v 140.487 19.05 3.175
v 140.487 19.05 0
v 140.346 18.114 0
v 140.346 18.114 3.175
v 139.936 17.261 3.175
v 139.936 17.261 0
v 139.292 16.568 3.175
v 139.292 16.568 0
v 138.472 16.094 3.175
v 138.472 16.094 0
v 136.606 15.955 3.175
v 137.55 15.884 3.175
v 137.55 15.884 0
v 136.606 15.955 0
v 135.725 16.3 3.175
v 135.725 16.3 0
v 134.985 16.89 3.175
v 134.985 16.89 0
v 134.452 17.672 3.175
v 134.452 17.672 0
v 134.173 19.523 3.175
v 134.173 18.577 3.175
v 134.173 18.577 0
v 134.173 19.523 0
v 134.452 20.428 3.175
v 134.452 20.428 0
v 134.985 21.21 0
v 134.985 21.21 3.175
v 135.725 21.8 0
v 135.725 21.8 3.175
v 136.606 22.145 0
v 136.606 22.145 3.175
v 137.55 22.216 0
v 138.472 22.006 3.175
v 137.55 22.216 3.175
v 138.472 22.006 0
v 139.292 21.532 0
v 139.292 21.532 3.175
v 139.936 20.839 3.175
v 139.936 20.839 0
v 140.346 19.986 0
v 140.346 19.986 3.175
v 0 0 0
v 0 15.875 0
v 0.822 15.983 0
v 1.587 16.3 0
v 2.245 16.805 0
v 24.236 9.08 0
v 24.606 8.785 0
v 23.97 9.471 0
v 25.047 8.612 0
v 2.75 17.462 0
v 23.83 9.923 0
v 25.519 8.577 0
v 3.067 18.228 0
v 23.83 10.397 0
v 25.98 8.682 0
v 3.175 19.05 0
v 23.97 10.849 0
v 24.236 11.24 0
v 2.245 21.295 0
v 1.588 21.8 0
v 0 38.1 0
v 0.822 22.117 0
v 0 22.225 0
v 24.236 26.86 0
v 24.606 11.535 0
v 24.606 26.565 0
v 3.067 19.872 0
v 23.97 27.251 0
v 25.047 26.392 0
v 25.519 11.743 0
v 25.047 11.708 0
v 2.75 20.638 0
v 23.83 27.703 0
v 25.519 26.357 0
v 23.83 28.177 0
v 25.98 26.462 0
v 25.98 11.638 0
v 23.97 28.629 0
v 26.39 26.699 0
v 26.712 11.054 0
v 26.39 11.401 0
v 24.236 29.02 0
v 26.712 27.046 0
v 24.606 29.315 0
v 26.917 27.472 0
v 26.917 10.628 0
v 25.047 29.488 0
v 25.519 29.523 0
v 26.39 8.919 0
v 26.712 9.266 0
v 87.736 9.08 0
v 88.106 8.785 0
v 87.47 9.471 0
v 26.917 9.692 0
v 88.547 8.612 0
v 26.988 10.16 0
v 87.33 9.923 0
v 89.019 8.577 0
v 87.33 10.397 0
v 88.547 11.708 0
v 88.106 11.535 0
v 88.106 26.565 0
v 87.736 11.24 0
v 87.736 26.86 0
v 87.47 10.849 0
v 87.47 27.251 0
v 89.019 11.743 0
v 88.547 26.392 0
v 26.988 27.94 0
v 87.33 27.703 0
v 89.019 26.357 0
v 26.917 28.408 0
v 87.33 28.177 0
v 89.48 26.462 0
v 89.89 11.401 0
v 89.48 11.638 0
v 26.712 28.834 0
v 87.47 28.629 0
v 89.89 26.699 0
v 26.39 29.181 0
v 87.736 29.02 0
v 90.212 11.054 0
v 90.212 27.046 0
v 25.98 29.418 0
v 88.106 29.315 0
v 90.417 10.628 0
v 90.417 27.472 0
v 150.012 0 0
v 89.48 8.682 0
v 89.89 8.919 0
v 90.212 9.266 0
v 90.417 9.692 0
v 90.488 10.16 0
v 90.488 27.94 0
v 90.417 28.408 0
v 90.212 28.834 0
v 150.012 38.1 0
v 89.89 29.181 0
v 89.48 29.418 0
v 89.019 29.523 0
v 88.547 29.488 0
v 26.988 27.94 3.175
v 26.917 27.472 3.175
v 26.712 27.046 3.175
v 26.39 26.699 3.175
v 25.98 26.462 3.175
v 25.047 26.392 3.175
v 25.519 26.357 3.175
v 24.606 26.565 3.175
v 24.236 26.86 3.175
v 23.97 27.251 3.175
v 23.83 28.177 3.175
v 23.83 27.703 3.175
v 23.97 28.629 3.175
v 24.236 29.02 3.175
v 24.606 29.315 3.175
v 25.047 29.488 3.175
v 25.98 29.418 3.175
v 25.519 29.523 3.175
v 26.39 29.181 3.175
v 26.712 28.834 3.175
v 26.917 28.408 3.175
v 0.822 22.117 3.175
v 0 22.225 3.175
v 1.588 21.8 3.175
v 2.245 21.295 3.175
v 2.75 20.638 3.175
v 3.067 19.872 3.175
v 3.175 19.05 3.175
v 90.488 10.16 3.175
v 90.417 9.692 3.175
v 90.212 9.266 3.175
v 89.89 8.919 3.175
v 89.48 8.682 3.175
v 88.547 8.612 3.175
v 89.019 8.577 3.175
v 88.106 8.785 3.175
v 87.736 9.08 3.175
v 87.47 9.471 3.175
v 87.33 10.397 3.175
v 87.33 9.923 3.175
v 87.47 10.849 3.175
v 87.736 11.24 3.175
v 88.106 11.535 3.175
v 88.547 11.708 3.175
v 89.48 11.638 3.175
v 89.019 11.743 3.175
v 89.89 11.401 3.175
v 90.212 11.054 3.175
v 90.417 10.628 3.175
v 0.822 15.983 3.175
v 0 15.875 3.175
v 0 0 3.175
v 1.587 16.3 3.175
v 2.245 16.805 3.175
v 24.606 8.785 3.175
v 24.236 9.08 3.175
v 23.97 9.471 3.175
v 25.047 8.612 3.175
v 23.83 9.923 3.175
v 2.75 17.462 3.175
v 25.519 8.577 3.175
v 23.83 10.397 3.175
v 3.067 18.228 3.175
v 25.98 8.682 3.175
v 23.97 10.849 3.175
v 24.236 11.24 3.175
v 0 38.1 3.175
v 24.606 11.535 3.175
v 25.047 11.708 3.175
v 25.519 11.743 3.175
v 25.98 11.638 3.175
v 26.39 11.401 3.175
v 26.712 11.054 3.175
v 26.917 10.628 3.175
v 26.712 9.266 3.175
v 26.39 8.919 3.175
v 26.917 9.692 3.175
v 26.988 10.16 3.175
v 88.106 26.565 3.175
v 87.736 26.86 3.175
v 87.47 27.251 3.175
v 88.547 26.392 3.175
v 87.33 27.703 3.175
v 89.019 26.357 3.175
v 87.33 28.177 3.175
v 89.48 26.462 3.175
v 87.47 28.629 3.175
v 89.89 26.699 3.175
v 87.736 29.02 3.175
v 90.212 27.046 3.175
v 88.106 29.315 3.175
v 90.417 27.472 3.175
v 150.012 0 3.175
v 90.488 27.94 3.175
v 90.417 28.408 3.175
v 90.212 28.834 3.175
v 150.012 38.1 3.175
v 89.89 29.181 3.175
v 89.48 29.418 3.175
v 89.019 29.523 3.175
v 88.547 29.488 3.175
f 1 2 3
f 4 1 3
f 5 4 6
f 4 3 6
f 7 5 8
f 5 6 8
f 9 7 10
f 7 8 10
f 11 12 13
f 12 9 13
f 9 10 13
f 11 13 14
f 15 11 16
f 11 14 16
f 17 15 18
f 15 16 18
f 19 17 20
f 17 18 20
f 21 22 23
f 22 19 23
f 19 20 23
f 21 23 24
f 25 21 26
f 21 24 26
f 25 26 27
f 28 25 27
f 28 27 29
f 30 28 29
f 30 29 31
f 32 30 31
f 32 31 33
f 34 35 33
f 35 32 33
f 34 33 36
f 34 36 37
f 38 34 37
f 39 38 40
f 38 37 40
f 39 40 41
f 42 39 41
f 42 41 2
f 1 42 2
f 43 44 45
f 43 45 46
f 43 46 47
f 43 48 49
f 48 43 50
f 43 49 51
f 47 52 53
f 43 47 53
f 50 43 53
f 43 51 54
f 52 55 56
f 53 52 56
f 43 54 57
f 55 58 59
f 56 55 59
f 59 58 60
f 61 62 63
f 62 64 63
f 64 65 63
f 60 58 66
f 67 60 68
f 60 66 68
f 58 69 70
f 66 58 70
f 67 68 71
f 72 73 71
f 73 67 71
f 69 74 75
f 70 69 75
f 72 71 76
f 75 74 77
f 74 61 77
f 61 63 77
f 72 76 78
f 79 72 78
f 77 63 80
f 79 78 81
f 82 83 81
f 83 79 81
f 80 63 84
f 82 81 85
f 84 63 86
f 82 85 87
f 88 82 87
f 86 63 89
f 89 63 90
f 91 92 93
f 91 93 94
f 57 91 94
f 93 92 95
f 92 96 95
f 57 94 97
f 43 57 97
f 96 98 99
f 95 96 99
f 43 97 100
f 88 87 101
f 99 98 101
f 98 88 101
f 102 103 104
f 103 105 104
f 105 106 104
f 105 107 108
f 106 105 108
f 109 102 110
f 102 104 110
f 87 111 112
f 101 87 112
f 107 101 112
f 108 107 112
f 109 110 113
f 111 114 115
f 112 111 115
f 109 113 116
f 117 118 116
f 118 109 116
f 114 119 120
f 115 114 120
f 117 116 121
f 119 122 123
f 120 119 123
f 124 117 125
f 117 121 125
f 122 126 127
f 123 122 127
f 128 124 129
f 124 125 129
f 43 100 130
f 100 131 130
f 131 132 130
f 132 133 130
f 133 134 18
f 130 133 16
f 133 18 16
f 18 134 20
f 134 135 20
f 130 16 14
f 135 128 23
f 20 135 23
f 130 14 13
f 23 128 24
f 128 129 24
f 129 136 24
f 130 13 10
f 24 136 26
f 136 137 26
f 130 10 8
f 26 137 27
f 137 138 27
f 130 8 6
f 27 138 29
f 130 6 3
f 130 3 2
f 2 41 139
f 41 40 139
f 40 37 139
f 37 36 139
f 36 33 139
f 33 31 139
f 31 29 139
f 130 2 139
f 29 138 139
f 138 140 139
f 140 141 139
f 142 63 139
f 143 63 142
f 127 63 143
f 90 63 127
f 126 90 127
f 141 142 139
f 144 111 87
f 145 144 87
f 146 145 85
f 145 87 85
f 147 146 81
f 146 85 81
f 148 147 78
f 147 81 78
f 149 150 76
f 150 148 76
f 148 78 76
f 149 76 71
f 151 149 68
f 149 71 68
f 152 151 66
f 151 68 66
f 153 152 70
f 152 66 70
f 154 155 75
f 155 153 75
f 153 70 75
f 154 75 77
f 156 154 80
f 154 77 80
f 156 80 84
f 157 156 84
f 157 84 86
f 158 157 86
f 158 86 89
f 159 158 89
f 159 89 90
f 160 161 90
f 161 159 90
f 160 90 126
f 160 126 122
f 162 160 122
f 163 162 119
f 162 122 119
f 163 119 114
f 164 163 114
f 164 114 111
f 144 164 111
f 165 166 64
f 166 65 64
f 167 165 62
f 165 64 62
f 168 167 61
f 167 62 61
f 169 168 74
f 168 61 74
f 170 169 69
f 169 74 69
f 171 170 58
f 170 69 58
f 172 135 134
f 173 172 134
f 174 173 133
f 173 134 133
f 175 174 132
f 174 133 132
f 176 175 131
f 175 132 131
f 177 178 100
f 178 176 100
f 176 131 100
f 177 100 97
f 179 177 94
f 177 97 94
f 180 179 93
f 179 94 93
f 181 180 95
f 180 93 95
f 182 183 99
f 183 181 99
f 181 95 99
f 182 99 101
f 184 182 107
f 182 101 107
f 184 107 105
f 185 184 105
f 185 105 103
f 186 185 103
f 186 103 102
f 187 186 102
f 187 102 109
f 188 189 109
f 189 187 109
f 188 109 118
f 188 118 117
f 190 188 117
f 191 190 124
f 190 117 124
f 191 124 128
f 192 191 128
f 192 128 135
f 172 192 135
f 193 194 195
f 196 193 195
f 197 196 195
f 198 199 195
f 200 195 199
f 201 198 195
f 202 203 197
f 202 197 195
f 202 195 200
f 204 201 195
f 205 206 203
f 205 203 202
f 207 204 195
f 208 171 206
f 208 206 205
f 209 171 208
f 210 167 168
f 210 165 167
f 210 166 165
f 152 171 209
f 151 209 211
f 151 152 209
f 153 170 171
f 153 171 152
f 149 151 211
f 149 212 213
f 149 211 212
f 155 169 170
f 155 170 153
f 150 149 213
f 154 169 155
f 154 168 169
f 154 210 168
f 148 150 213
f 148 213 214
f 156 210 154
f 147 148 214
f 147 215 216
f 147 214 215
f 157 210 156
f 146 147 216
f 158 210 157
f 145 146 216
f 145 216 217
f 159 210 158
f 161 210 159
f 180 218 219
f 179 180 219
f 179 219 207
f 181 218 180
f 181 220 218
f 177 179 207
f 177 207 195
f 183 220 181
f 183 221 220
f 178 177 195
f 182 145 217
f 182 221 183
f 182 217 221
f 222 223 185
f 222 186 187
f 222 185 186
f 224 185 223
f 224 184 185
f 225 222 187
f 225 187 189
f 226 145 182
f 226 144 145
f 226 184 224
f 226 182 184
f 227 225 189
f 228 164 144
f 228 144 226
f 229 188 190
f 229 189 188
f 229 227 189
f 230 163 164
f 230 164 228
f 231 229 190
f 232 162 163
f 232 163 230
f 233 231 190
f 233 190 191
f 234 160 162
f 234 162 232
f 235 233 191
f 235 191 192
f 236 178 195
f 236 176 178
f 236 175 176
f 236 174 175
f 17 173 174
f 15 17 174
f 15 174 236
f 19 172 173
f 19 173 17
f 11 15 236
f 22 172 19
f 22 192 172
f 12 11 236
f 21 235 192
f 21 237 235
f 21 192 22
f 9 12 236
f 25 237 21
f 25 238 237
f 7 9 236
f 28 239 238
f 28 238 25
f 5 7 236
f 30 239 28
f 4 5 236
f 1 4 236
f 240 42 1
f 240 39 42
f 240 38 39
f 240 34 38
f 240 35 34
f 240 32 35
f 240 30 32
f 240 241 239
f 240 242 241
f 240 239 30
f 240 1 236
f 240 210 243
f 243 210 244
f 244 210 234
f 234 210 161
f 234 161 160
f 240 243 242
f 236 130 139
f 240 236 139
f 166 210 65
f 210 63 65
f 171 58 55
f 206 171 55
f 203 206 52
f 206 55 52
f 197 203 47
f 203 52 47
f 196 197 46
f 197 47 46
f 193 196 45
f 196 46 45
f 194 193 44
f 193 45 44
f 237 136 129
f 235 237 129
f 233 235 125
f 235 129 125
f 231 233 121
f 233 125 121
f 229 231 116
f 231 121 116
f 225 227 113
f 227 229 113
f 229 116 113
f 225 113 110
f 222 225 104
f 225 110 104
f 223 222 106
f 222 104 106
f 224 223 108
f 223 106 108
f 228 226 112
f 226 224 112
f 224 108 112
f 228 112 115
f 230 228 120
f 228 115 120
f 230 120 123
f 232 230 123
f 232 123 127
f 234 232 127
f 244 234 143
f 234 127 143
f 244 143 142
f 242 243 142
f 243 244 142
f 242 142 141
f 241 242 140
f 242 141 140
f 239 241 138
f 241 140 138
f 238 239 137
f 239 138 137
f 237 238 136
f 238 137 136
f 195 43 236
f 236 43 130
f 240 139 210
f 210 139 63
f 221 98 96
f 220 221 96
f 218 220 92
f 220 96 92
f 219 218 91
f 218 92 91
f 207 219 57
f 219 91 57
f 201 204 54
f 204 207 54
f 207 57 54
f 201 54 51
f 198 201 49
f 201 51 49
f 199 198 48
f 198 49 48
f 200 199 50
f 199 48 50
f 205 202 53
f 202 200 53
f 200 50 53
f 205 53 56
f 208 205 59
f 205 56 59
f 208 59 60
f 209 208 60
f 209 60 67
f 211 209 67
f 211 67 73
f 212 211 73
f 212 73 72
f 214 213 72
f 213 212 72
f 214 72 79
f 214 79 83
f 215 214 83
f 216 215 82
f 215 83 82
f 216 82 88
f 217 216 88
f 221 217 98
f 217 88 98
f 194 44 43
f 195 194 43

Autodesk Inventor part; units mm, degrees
ref_plane "YZ Plane" through (0, 0, 0) normal (1, 0, 0) x (0, 1, 0)
ref_plane "XZ Plane" through (0, 0, 0) normal (0, 1, 0) x (-1, 0, 0)
ref_plane "XY Plane" through (0, 0, 0) normal (0, 0, 1) x (1, 0, 0)
sketch "Sketch2" plane through (0, 0, 0) normal (0, 0, 1) x (1, 0, 0)
  line L0 (0, 0) -> (150.0124, 0)
  line L1 (150.0124, 0) -> (150.0124, 38.1)
  line L2 (150.0124, 38.1) -> (0, 38.1)
  line L3 (0, 38.1) -> (0, 0)
  circle A0 centre (137.3124, 19.05) radius 3.175
  circle A1 centre (25.4, 27.94) radius 1.5875
  circle A2 centre (88.9, 27.94) radius 1.5875
  circle A3 centre (88.9, 10.16) radius 1.5875
  circle A4 centre (25.4, 10.16) radius 1.5875
  circle A5 centre (0, 19.05) radius 3.175
  point P0 (0, 22.225)
  point P1 (0, 15.875)
  dimension "d0" = 150.0124
  dimension "d1" = 38.1
  dimension "d2" = 6.35
  dimension "d3" = 3.175
  dimension "d4" = 3.175
  dimension "d5" = 3.175
  dimension "d6" = 3.175
  dimension "d7" = 6.35
  dimension "d8" = 25.4
  dimension "d9" = 10.16
  dimension "d10" = 10.16
  dimension "d12" = 88.9
  dimension "d13" = 88.9
  dimension "d14" = 10.16
  dimension "d15" = 10.16
  dimension "d16" = 25.4
  dimension "d17" = 19.05
  dimension "d18" = 12.7
extrude "Extrusion1" add sketch "Sketch2" along normal blind 3.175 contours L3 A5 L2 L1 L0
properties part number "arm counterweight"
